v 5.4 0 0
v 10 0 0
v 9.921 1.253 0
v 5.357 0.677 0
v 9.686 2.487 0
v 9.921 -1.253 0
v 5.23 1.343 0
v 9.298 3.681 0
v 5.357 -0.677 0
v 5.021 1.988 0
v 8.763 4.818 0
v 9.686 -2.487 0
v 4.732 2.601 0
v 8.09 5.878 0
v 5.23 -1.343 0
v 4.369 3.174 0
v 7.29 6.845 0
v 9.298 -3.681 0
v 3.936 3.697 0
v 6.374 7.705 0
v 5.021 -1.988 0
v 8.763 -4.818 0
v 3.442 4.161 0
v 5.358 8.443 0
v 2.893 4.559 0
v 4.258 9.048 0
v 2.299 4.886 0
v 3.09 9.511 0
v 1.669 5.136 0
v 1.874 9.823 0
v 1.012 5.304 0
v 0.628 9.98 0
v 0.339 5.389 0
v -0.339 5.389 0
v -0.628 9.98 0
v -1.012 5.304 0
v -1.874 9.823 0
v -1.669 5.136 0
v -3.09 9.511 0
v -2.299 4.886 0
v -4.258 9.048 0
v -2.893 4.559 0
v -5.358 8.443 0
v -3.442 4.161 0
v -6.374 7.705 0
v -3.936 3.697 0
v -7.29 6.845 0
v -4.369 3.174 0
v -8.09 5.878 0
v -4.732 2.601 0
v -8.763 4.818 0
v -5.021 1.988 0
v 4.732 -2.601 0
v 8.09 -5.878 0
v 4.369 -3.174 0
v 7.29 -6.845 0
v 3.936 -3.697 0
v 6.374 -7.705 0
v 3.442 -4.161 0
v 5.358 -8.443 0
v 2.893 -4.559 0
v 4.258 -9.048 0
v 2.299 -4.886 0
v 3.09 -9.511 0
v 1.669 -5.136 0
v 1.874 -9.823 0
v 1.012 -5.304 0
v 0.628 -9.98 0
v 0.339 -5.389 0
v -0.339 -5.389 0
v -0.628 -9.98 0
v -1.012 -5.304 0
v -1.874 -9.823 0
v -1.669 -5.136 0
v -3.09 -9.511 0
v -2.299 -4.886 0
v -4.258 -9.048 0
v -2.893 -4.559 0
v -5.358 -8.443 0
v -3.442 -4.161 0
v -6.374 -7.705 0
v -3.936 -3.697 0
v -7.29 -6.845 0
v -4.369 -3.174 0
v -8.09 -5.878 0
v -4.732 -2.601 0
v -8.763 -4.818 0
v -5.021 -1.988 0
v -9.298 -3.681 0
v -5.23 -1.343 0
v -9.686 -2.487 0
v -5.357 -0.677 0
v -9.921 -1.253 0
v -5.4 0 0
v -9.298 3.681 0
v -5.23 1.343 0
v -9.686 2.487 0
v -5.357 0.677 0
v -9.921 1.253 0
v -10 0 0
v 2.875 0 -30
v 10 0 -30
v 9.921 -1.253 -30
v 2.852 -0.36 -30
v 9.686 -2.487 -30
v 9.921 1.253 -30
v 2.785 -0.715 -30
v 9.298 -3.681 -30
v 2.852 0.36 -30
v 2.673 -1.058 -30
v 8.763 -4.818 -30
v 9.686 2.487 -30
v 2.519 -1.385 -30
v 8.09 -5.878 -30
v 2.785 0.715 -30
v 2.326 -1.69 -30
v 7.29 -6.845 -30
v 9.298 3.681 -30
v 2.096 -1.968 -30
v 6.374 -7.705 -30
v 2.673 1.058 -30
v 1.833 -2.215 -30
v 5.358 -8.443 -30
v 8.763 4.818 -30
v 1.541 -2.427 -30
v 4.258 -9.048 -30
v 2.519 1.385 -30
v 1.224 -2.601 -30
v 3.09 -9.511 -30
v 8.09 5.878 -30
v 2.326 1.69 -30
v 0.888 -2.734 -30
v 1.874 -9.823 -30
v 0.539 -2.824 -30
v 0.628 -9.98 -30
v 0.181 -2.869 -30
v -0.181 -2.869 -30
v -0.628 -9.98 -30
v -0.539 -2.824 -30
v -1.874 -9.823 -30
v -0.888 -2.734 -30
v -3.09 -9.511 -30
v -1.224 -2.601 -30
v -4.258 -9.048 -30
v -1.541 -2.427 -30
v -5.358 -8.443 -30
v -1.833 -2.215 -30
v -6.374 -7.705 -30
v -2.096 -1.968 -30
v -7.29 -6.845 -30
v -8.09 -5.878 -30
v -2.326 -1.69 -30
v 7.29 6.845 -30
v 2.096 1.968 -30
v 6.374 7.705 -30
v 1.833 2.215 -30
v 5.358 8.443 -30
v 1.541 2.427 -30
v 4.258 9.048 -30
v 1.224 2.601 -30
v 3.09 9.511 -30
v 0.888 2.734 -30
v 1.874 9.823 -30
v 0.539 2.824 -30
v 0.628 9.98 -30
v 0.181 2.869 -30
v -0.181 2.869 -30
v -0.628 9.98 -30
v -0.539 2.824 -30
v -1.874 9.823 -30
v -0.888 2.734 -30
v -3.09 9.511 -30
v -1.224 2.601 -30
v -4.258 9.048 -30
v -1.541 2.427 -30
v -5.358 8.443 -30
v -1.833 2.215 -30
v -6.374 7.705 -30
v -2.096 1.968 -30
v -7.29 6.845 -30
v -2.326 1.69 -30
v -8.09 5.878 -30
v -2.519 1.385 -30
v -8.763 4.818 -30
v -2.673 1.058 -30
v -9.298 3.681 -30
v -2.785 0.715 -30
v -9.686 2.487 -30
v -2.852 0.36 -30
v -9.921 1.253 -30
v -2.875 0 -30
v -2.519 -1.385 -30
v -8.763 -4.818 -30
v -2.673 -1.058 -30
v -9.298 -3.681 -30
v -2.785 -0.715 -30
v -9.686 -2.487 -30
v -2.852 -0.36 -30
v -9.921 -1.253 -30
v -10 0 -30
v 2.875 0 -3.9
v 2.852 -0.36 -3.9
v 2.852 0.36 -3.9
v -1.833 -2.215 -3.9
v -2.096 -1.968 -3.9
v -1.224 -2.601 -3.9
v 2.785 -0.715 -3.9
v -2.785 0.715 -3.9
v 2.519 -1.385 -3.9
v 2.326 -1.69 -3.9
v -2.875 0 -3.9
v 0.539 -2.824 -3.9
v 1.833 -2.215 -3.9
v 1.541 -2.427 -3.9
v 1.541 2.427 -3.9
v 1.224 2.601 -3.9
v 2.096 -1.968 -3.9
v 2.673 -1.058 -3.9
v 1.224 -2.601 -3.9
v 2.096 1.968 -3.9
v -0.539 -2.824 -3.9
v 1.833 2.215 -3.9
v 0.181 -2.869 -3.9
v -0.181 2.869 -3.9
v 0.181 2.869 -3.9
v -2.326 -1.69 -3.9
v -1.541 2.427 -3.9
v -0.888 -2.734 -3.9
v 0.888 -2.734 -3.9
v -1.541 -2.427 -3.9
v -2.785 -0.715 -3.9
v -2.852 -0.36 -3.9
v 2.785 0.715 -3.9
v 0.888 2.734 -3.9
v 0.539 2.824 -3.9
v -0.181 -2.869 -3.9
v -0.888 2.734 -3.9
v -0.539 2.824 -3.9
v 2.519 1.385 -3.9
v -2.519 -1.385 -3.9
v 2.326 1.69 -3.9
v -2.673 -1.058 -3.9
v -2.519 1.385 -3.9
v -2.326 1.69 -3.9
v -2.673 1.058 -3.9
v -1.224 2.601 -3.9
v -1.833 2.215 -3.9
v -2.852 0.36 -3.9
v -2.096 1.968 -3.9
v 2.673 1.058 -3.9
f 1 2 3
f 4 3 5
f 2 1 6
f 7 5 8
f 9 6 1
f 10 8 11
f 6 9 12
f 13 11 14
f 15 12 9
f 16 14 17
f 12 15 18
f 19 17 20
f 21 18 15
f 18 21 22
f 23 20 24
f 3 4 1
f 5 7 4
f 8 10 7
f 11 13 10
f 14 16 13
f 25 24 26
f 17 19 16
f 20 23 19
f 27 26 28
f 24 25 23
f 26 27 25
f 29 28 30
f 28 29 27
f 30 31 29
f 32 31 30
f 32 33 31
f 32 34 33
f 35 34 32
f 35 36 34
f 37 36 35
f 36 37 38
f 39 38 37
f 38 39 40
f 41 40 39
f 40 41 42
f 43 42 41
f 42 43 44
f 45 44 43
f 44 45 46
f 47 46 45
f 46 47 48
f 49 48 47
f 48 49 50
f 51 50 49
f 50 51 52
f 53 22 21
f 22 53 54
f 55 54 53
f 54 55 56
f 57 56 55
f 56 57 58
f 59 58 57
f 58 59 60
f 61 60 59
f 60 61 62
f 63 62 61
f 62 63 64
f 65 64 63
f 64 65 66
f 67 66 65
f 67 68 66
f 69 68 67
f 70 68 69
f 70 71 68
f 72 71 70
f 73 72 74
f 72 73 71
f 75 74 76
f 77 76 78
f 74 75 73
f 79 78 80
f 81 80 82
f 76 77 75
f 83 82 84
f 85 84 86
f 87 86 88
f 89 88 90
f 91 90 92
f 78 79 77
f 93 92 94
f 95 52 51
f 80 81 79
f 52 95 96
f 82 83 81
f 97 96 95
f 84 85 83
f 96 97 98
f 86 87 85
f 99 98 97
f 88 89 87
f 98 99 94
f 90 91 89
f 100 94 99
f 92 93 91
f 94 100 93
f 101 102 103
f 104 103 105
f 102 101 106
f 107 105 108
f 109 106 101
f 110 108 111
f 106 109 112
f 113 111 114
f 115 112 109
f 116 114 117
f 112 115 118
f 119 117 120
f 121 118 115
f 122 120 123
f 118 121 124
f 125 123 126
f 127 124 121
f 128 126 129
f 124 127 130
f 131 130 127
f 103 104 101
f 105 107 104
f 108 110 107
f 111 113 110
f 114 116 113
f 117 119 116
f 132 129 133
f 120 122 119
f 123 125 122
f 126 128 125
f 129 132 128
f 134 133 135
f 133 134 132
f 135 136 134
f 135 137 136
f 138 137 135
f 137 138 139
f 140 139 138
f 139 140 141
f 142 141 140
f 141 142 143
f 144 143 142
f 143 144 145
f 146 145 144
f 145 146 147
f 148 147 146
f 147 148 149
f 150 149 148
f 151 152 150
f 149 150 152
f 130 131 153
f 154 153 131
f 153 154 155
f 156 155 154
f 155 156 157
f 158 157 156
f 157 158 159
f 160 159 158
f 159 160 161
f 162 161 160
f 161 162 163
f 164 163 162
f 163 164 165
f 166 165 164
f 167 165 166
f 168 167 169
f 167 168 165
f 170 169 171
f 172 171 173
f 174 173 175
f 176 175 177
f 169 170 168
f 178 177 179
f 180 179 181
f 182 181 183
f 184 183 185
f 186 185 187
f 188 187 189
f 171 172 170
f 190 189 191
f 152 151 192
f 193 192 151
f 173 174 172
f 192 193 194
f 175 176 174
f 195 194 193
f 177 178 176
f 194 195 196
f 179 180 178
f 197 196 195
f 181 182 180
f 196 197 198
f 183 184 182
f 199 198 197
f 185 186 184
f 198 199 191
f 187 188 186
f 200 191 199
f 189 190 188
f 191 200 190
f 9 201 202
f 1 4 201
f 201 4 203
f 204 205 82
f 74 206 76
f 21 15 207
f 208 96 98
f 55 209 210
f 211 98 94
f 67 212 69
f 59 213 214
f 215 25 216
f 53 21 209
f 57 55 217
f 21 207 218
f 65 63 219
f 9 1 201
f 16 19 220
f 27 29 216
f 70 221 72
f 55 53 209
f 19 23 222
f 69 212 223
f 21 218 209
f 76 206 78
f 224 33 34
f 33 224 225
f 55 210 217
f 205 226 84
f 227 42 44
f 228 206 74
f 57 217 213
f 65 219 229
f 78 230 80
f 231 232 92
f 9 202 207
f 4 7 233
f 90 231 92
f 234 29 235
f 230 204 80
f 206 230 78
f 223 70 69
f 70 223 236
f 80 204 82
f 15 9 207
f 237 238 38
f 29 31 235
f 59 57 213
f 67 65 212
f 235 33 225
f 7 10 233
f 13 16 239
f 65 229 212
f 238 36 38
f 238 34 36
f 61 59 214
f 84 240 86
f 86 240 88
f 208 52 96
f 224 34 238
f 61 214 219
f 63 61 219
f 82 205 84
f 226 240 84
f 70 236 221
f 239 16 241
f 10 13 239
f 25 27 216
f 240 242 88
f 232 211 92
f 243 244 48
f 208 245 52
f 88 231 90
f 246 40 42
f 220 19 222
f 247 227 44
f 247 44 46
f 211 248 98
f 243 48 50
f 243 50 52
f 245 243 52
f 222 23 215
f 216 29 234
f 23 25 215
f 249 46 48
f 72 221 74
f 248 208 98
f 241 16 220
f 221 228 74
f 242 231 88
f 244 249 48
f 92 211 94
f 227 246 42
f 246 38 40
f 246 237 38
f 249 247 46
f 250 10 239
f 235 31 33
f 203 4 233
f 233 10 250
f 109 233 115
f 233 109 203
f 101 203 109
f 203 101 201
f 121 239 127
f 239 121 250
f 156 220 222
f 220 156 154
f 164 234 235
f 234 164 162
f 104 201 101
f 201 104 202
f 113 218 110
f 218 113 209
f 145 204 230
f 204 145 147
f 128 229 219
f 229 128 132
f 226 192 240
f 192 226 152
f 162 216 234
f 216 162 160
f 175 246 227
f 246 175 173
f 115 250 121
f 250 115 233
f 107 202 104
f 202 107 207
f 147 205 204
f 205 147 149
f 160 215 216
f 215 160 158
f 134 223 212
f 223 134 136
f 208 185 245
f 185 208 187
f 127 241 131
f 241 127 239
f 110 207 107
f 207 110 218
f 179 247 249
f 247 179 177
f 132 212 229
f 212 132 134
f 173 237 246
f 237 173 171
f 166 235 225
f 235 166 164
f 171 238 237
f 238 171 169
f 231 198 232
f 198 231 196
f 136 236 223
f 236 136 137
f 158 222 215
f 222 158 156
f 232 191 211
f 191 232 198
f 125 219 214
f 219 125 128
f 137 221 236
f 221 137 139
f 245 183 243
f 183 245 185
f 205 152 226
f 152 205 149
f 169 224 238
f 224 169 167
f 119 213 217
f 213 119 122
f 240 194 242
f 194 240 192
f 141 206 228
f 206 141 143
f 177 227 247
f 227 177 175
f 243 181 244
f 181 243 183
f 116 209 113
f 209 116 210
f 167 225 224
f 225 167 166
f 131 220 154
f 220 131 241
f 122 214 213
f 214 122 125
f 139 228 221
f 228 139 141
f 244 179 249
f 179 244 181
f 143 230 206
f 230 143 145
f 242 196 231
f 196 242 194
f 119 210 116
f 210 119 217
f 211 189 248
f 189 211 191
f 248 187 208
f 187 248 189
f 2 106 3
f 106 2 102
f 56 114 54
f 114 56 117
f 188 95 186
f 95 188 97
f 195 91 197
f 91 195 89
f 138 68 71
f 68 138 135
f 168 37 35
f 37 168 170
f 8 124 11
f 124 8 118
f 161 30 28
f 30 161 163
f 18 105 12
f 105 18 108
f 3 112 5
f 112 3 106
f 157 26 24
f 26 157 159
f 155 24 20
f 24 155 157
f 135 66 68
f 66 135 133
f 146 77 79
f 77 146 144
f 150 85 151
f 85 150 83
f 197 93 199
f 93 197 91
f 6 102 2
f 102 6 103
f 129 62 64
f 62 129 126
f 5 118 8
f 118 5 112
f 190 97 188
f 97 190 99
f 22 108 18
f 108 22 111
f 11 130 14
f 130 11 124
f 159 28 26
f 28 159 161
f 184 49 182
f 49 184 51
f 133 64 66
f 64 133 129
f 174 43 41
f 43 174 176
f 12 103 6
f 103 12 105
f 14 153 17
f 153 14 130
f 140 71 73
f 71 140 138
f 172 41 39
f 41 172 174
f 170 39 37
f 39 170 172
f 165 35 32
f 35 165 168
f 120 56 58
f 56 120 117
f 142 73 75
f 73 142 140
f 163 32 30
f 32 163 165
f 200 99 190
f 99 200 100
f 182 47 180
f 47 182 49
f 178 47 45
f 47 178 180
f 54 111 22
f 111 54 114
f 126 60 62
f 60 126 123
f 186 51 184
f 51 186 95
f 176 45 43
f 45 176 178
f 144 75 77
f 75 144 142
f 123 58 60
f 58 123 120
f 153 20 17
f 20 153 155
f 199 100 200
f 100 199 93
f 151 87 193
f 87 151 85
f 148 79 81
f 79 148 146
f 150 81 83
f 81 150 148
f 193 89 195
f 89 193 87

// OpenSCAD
$fn = 50;


difference() {
	union() {
		translate(v = [0, 0, -30.0000000000]) {
			cylinder(h = 30, r = 10.0000000000);
		}
		cylinder(h = 0, r = 19.0000000000);
	}
	union() {
		translate(v = [0, 0, 0]) {
			rotate(a = [0, 0, 0]) {
				difference() {
					union() {
						#translate(v = [0, 0, -30.0000000000]) {
							cylinder(h = 30, r = 2.6000000000);
						}
						#translate(v = [0, 0, -3.9000000000]) {
							cylinder(h = 3.9000000000, r = 10.0000000000, r1 = 2.8750000000, r2 = 5.4000000000);
						}
						#translate(v = [0, 0, -30.0000000000]) {
							cylinder(h = 30, r = 2.8750000000);
						}
						#translate(v = [0, 0, -30.0000000000]) {
							cylinder(h = 30, r = 2.6000000000);
						}
					}
					union();
				}
			}
		}
	}
}
